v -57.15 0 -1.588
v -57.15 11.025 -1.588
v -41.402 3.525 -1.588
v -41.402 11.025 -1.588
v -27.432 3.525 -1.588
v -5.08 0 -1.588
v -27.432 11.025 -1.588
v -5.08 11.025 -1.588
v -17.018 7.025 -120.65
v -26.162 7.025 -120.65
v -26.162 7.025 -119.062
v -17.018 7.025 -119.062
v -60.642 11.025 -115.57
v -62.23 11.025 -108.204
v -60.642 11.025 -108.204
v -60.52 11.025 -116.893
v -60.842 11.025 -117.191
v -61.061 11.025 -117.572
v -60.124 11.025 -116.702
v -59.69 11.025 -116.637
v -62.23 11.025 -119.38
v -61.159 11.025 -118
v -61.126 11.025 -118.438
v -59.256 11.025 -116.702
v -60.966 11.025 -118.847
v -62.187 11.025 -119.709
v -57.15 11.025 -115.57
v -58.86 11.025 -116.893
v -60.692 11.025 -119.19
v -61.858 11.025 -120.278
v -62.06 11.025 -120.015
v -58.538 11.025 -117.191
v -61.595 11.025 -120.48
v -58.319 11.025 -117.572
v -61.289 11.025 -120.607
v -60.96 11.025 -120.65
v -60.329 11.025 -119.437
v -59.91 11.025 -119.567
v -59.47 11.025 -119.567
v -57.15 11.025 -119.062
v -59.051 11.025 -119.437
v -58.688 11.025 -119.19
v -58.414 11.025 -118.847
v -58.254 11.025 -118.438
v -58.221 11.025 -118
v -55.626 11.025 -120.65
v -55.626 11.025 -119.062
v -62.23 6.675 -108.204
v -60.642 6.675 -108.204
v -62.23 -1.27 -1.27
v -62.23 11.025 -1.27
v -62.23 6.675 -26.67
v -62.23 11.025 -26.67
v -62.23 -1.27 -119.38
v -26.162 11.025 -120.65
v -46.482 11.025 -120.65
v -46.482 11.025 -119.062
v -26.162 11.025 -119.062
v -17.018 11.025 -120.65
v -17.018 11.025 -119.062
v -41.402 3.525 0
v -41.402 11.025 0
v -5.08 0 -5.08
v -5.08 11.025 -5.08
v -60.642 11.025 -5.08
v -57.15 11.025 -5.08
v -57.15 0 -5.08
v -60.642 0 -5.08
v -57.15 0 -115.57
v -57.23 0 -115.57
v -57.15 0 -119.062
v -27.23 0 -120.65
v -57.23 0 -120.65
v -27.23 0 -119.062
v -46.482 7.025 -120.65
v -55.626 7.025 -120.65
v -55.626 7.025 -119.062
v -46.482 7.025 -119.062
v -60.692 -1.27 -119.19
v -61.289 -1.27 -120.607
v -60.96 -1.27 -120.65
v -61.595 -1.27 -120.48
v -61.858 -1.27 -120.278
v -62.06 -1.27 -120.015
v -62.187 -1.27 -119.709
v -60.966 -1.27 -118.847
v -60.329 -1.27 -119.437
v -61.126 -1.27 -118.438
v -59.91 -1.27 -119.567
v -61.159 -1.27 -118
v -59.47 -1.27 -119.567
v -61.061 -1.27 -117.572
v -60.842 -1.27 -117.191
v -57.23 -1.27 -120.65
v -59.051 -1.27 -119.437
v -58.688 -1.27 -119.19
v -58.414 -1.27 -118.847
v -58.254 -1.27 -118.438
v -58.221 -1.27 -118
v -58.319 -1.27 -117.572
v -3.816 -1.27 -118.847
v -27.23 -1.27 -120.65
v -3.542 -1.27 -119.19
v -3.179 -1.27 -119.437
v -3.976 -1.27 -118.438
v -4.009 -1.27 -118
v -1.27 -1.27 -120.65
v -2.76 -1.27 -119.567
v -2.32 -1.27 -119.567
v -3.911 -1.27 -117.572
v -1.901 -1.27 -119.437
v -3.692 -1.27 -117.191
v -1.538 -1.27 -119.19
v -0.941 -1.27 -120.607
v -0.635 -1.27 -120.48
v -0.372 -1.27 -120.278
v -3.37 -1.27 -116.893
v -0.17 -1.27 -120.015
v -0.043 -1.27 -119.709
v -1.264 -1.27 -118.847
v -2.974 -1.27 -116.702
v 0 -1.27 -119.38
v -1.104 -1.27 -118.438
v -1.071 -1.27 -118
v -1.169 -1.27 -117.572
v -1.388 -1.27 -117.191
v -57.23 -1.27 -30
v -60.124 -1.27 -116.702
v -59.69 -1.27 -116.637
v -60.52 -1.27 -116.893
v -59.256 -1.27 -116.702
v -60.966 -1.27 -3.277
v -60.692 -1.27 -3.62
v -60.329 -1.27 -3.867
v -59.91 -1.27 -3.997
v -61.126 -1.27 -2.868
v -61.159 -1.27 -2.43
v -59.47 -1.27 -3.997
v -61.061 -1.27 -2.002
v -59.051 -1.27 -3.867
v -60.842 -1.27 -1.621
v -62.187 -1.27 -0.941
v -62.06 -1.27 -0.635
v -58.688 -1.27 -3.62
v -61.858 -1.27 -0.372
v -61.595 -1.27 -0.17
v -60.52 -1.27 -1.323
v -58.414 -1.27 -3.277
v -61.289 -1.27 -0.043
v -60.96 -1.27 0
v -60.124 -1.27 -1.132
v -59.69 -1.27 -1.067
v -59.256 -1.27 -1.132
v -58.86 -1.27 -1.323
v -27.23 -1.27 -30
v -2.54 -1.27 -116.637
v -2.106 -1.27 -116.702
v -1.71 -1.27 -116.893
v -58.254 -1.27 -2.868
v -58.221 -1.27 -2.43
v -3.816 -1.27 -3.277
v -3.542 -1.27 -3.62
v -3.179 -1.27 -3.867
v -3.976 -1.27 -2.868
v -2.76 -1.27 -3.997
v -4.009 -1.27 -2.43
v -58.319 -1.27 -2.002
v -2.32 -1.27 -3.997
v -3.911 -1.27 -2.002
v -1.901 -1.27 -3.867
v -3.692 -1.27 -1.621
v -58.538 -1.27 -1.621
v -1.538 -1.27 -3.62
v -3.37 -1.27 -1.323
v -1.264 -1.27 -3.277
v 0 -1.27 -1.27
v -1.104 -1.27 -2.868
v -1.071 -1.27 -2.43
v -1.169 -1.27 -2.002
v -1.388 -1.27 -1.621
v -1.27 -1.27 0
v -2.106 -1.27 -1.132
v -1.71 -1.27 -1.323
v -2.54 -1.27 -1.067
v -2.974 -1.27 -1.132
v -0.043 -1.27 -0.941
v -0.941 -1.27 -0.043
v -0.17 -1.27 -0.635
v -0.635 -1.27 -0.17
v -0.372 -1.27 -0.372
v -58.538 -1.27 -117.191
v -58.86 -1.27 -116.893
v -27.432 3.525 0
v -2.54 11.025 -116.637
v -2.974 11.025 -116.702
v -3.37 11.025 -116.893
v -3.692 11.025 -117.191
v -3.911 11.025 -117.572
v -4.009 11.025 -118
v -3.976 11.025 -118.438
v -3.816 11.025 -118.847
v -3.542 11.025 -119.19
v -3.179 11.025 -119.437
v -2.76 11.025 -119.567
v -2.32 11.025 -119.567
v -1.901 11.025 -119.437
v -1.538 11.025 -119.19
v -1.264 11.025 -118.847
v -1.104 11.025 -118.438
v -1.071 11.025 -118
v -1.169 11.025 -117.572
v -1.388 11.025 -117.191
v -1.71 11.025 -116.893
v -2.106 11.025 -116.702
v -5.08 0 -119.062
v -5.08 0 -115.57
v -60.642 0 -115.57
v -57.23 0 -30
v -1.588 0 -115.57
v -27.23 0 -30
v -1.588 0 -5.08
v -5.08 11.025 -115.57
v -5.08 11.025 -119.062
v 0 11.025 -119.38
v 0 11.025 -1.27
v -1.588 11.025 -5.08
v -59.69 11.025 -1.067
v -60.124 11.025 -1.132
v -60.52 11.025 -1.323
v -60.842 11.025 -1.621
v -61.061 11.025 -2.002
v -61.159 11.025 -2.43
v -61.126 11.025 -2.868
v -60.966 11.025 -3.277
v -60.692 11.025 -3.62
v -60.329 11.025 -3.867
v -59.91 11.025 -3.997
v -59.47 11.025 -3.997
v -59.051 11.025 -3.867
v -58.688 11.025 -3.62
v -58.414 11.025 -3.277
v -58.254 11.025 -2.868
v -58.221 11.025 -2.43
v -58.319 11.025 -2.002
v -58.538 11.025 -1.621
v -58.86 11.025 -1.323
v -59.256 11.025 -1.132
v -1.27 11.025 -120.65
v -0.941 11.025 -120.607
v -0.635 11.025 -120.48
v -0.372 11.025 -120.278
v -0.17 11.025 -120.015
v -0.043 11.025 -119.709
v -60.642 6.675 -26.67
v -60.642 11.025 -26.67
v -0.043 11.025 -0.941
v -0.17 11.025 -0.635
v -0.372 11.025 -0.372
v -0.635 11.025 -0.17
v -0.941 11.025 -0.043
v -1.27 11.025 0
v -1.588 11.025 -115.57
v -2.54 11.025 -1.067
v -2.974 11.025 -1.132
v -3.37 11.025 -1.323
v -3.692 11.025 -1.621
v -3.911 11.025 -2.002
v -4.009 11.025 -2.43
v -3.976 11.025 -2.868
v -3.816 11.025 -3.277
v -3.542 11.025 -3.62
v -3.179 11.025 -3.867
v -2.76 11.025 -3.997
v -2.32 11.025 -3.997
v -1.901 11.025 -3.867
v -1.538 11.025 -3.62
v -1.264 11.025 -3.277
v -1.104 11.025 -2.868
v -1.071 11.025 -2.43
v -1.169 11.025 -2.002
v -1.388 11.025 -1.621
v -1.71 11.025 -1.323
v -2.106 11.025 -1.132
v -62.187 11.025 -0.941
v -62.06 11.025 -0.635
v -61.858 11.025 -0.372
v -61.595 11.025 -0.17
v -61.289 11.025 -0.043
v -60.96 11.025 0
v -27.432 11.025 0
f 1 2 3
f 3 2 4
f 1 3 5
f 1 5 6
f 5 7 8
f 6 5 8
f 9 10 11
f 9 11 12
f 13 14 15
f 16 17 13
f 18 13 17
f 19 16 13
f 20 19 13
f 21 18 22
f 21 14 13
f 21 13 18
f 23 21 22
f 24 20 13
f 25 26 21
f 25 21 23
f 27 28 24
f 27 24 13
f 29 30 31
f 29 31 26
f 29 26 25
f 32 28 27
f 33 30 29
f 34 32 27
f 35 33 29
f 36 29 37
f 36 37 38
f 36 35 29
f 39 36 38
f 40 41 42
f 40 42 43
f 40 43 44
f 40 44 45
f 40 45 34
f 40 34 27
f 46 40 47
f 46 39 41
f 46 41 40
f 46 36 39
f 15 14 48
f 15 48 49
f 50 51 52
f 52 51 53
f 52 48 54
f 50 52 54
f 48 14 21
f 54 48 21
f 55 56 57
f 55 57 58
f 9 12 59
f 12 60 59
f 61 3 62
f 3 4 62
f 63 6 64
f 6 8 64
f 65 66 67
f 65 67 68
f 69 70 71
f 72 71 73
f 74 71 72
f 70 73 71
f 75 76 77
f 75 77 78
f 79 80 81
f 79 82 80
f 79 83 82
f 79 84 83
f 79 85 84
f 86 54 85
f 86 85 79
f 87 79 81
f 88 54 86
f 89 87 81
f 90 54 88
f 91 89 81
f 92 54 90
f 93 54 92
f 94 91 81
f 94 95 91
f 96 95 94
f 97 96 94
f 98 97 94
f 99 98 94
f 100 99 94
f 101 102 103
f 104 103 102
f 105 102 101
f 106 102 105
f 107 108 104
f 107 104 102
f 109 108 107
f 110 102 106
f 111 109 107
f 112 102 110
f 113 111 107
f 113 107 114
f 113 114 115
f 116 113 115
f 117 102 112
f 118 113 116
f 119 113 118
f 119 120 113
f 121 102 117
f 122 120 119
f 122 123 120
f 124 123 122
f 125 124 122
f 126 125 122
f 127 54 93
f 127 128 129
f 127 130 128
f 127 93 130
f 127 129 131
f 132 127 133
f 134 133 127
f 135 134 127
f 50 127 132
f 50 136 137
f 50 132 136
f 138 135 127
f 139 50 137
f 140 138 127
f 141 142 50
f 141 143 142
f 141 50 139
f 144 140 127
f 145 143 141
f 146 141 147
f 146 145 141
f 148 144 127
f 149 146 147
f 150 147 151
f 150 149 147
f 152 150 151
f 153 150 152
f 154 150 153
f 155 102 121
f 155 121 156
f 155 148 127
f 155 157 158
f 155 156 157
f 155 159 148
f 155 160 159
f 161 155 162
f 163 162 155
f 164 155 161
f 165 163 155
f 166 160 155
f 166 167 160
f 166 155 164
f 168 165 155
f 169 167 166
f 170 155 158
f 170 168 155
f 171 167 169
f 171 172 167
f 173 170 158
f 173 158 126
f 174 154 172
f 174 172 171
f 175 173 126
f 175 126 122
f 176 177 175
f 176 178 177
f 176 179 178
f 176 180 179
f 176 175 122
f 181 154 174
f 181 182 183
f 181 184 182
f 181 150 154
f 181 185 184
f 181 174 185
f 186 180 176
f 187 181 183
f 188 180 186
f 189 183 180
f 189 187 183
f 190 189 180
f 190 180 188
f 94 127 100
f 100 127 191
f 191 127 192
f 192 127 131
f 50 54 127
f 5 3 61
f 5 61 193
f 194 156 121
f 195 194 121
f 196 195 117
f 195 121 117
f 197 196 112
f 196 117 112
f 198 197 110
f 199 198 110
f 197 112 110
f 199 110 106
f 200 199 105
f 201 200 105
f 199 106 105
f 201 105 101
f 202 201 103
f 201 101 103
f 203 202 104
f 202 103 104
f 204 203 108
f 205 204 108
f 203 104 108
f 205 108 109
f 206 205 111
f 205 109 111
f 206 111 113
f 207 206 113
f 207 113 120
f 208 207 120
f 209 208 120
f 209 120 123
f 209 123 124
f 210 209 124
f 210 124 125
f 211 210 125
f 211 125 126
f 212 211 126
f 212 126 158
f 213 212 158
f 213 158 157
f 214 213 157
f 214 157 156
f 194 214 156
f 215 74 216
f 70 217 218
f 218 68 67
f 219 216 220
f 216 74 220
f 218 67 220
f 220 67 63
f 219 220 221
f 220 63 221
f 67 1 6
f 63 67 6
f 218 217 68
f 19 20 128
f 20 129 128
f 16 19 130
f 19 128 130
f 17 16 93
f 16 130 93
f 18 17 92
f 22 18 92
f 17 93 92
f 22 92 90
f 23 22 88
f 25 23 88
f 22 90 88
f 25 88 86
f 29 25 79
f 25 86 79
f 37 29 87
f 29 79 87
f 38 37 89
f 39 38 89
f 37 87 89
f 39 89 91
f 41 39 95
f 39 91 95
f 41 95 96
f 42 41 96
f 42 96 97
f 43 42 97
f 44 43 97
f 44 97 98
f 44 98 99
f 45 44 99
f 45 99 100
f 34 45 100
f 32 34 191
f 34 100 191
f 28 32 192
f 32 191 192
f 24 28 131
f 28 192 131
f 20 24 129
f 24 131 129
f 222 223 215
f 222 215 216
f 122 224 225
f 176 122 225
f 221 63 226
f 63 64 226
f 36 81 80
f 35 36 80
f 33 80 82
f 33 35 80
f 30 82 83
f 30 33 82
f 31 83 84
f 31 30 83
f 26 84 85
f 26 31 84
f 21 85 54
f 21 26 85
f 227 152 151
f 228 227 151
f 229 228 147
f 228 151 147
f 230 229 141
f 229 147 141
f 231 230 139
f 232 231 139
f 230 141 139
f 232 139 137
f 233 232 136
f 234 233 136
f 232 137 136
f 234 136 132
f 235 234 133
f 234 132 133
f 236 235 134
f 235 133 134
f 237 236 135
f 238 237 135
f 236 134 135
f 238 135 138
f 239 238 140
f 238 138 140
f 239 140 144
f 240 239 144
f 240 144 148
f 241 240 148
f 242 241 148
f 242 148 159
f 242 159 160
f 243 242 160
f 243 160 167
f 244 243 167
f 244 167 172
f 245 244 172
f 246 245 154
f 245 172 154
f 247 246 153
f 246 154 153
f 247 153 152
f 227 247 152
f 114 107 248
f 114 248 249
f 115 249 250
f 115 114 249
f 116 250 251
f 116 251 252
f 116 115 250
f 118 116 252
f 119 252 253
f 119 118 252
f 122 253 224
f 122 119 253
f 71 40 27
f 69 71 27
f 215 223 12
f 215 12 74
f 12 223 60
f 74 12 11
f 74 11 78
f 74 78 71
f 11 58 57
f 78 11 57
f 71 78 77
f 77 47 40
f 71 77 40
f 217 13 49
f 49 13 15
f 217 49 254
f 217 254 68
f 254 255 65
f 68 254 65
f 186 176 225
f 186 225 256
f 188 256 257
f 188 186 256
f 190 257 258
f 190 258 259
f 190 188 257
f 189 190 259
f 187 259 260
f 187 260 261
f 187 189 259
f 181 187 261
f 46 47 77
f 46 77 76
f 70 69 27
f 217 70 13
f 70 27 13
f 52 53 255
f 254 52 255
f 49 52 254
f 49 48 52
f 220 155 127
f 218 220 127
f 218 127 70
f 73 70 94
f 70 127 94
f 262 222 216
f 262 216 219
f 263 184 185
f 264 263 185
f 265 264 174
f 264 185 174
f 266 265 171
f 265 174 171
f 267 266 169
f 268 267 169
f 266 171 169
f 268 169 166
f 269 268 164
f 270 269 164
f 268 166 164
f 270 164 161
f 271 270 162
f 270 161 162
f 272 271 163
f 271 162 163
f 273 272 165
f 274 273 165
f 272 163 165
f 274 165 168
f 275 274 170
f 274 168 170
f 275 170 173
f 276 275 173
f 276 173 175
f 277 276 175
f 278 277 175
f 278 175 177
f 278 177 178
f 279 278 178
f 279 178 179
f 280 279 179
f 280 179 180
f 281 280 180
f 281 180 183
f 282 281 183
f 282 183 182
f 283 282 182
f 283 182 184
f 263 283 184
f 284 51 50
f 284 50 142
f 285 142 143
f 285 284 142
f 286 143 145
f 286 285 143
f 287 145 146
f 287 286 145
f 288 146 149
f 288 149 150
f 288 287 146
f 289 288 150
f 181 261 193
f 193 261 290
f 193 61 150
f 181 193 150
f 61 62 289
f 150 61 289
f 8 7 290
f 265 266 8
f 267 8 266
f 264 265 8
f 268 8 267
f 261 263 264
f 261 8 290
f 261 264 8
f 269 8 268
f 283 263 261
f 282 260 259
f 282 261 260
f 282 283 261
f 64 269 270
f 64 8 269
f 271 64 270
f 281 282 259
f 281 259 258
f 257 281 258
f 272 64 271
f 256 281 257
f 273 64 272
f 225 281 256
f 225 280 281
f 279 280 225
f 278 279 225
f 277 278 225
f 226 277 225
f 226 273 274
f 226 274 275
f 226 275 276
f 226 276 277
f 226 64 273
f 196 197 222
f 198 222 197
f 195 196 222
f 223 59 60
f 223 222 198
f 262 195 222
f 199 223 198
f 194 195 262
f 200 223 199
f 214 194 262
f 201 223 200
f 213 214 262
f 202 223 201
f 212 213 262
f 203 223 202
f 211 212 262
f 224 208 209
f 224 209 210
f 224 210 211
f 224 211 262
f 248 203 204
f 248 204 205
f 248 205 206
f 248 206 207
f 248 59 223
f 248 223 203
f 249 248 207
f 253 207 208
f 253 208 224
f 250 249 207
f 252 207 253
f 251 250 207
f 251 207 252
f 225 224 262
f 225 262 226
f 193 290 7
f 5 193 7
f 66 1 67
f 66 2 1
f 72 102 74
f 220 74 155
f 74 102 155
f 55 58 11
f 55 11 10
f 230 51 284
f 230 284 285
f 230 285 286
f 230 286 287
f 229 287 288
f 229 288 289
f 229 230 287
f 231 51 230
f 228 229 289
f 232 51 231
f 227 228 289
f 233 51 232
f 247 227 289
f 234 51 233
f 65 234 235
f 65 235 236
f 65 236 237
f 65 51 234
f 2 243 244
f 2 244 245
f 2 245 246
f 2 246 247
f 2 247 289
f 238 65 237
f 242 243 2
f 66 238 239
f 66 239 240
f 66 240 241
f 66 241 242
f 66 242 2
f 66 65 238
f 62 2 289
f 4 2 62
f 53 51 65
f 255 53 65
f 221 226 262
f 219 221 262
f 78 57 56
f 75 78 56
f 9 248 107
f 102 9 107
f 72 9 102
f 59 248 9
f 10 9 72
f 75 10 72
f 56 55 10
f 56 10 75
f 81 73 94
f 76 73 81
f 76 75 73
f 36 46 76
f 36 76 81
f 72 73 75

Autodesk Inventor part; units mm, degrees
ref_plane "YZ Plane" through (0, 0, 0) normal (1, 0, 0) x (0, 1, 0)
ref_plane "XZ Plane" through (0, 0, 0) normal (0, 1, 0) x (-1, 0, 0)
ref_plane "XY Plane" through (0, 0, 0) normal (0, 0, 1) x (1, 0, 0)
sketch "Sketch1" plane through (0, 0, 0) normal (0, 1, 0) x (-1, 0, 0)
  line L0 (0, 0) -> (62.23, 0)
  line L1 (62.23, 0) -> (62.23, -120.65)
  line L2 (62.23, -120.65) -> (0, -120.65)
  line L3 (0, -120.65) -> (0, 0)
  dimension "d0" = 62.23
  dimension "d1" = 120.65
extrude "Extrusion1" add sketch "Sketch1" along normal blind 1.5
sketch "Sketch2" plane through (0, 1.5, 0) normal (0, 1, 0) x (1, 0, 0)
  line L0 (-60.6425, 1.5875) -> (-1.5875, 1.5875)
  line L1 (-1.5875, 1.5875) -> (-1.5875, 119.0625)
  line L2 (-1.5875, 119.0625) -> (-60.6425, 119.0625)
  line L3 (-60.6425, 119.0625) -> (-60.6425, 1.5875)
  line L4 (-62.23, 0) -> (0, 0) projected
  line L5 (0, 0) -> (0, 120.65) projected
  line L6 (-62.23, 120.65) -> (-62.23, 0) projected
  line L7 (0, 120.65) -> (-62.23, 120.65) projected
  line L8 (0, 0) -> (-5.08, 0)
  line L9 (-5.08, 0) -> (-5.08, 5.08)
  line L10 (-5.08, 5.08) -> (0, 5.08)
  line L11 (0, 5.08) -> (0, 0)
  line L12 (-62.23, 0) -> (-57.15, 0)
  line L13 (-57.15, 0) -> (-57.15, 5.08)
  line L14 (-57.15, 5.08) -> (-62.23, 5.08)
  line L15 (-62.23, 5.08) -> (-62.23, 0)
  line L16 (0, 120.65) -> (-5.08, 120.65)
  line L17 (-5.08, 120.65) -> (-5.08, 115.57)
  line L18 (-5.08, 115.57) -> (0, 115.57)
  line L19 (0, 115.57) -> (0, 120.65)
  line L20 (-62.23, 120.65) -> (-57.15, 120.65)
  line L21 (-57.15, 120.65) -> (-57.15, 115.57)
  line L22 (-57.15, 115.57) -> (-62.23, 115.57)
  line L23 (-62.23, 115.57) -> (-62.23, 120.65)
  point P0 (0, 115.57)
  point P1 (-1.5875, 115.57)
  point P2 (-1.5875, 5.08)
  point P3 (-5.08, 1.5875)
  point P4 (-57.15, 1.5875)
  point P5 (-60.6425, 5.08)
  point P6 (-5.08, 119.0625)
  point P7 (-60.6425, 115.57)
  point P8 (-57.15, 119.0625)
  dimension "d4" = 1.5875
  dimension "d5" = 1.5875
  dimension "d6" = 1.5875
  dimension "d7" = 1.5875
  dimension "d8" = 5.08
  dimension "d9" = 5.08
  dimension "d10" = 5.08
  dimension "d11" = 5.08
  dimension "d12" = 5.08
  dimension "d13" = 5.08
  dimension "d14" = 5.08
  dimension "d15" = 5.08
extrude "Extrusion3" add sketch "Sketch2" along normal blind 9.525 contours L3 L14 L13 L0 | L0 L13 L4 L6 L14 L3 | L0 L9 L4 L13 | L14 L6 L22 L3 | L9 L10 L1 L0 | L0 L1 L10 L5 L4 L9 | L22 L6 L7 L21 L2 L3 | L3 L2 L21 L22 | L1 L18 L5 L10 | L21 L7 L17 L2 | L18 L17 L2 L1 | L1 L2 L17 L7 L5 L18
sketch "Sketch3" plane through (0, 11.025, 0) normal (0, 1, 0) x (1, 0, 0)
  line L0 (-62.23, 0) -> (0, 0) projected
  line L1 (-41.402, 0) -> (-27.432, 0)
  line L2 (-27.432, 0) -> (-27.432, 1.5875)
  line L3 (-27.432, 1.5875) -> (-41.402, 1.5875)
  line L4 (-41.402, 1.5875) -> (-41.402, 0)
  line L5 (0, 0) -> (0, 120.65) projected
  line L6 (-62.23, 120.65) -> (-62.23, 0) projected
  line L7 (0, 120.65) -> (-62.23, 120.65) projected
  line L8 (-60.6425, 115.57) -> (-60.6425, 5.08) projected
  line L9 (-62.23, 60.325) -> (-60.6425, 60.325)
  line L10 (-60.6425, 60.325) -> (-60.6425, 98.425)
  line L11 (-60.6425, 98.425) -> (-62.23, 98.425)
  line L12 (-62.23, 98.425) -> (-62.23, 60.325)
  point P0 (-59.69, 2.54)
  point P1 (-59.69, 118.11)
  point P2 (-2.54, 118.11)
  point P3 (-2.54, 2.54)
  dimension "d20" = 27.432
  dimension "d21" = 20.828
  dimension "d22" = 2.54
  dimension "d23" = 2.54
  dimension "d24" = 2.54
  dimension "d25" = 2.54
  dimension "d26" = 2.54
  dimension "d27" = 2.54
  dimension "d28" = 2.54
  dimension "d29" = 2.54
  dimension "d47" = 60.325
  dimension "d48" = 22.225
  dimension "d57" = 62.23
extrude "Extrusion4" cut sketch "Sketch3" against normal blind 7.5 contours L4 L3 L2 L0
sketch "Sketch5" plane through (0, 11.025, 0) normal (0, 1, 0) x (1, 0, 0)
  line L0 (-60.6425, 5.08) -> (-60.6425, 115.57) projected
  line L1 (-62.23, 120.65) -> (-62.23, 0) projected
  line L2 (-62.23, 108.204) -> (-60.6425, 108.204)
  line L3 (-62.23, 26.67) -> (-60.6425, 26.67)
  line L4 (-62.23, 0) -> (-41.402, 0) projected
  line L5 (0, 120.65) -> (-62.23, 120.65) projected
  point P0 (0, 0)
  dimension "d49" = 26.67
  dimension "d50" = 108.204
extrude "Extrusion5" cut sketch "Sketch5" against normal blind 4.35
sketch "Sketch6" plane through (0, 1.5, 0) normal (0, 1, 0) x (1, 0, 0)
  point P0 (0, 0)
extrude "Extrusion6" cut sketch "Sketch2" against normal through all contours L13 L14 L3 L22 L21 L2 L17 L18 L1 L10 L9 L0
sketch "Sketch7" plane through (0, 11.025, 0) normal (0, 1, 0) x (1, 0, 0)
  line L0 (-57.15, 119.0625) -> (-5.08, 119.0625) projected
  line L1 (-55.626, 119.0625) -> (-55.626, 120.65)
  line L2 (0, 120.65) -> (-62.23, 120.65) projected
  line L3 (-46.482, 119.0625) -> (-46.482, 120.65)
  line L4 (-62.23, 120.65) -> (-62.23, 108.204) projected
  line L5 (-26.162, 119.0625) -> (-26.162, 120.65)
  line L6 (-17.018, 119.0625) -> (-17.018, 120.65)
  point P0 (0, 0)
  dimension "d60" = 9.144
  dimension "d61" = 6.604
  dimension "d62" = 9.144
  dimension "d63" = 36.068
extrude "Extrusion7" cut sketch "Sketch7" against normal blind 4 contours L1 L2 L3 L0 | L5 L2 L6 L0
sketch "Sketch8" plane through (0, 0, 0) normal (0, -1, 0) x (1, 0, 0)
  line L0 (0, -120.65) -> (-62.23, -120.65) projected
  line L1 (-62.23, -120.65) -> (0, -120.65)
  line L2 (0, -120.65) -> (0, 0)
  line L3 (0, 0) -> (-62.23, 0)
  line L4 (-62.23, 0) -> (-62.23, -120.65)
extrude "Extrusion8" add sketch "Sketch8" along normal blind 1.27
sketch "Sketch9" plane through (0, -1.27, 0) normal (0, -1, 0) x (1, 0, 0)
  line L0 (-57.23, -120.65) -> (-27.23, -120.65)
  line L1 (-27.23, -120.65) -> (-27.23, -30)
  line L2 (-27.23, -30) -> (-57.23, -30)
  line L3 (-57.23, -30) -> (-57.23, -120.65)
  line L4 (0, 0) -> (-62.23, 0) projected
  line L5 (-62.23, 0) -> (-62.23, -120.65) projected
  dimension "d70" = 30
  dimension "d71" = 30
  dimension "d75" = 5
extrude "Extrusion9" cut sketch "Sketch9" against normal up to surface (1.27 mm away)
sketch "Sketch4" plane through (0, 11.025, 0) normal (0, 1, 0) x (1, 0, 0)
  line L0 (-27.432, 0) -> (0, 0) projected
  line L1 (0, 0) -> (0, 120.65) projected
  line L2 (-62.23, 0) -> (-41.402, 0) projected
  line L3 (-62.23, 120.65) -> (-62.23, 0) projected
  line L4 (0, 120.65) -> (-62.23, 120.65) projected
  point P0 (-2.54, 2.54)
  point P1 (-2.54, 118.11)
  point P2 (-59.69, 118.11)
  point P3 (-59.69, 2.54)
  dimension "d39" = 2.54
  dimension "d40" = 2.54
  dimension "d41" = 2.54
  dimension "d42" = 2.54
  dimension "d43" = 2.54
  dimension "d44" = 2.54
  dimension "d45" = 2.54
  dimension "d46" = 2.54
hole "Hole1" at (-2.54, 11.025, -2.54) at (-2.54, 11.025, -118.11) at (-59.69, 11.025, -118.11) at (-59.69, 11.025, -2.54) direction (0, -1, 0) diameter 2.9464 end through all clearance for "Socket Head Cap Screw" size "#4" standard "Ansi Unified Screw Threads"
fillet "Fillet3" radius 1.27 4 edges at (0, 4.8775, -120.65) (0, 4.8775, 0) (-62.23, 4.8775, -120.65) (-62.23, 4.8775, 0)
equation "\"d4\" = d5"
equation "\"d6\" = d5"
equation "\"d7\" = d5"
equation "\"d10\" = d8"
equation "\"d11\" = d10"
equation "\"d12\" = d8"
equation "\"d13\" = d8"
equation "\"d14\" = d8"
equation "\"d15\" = d8"
equation "\"d24\" = d22"
equation "\"d25\" = d24"
equation "\"d26\" = d25"
equation "\"d27\" = d26"
equation "\"d28\" = d22"
equation "\"d29\" = d28"
equation "\"d62\" = d60"
equation "\"d40\" = d39"
equation "\"d41\" = d39"
equation "\"d42\" = d41"
equation "\"d43\" = d42"
equation "\"d44\" = d43"
equation "\"d45\" = d44"
equation "\"d46\" = d45"
properties part number "cover_top"
